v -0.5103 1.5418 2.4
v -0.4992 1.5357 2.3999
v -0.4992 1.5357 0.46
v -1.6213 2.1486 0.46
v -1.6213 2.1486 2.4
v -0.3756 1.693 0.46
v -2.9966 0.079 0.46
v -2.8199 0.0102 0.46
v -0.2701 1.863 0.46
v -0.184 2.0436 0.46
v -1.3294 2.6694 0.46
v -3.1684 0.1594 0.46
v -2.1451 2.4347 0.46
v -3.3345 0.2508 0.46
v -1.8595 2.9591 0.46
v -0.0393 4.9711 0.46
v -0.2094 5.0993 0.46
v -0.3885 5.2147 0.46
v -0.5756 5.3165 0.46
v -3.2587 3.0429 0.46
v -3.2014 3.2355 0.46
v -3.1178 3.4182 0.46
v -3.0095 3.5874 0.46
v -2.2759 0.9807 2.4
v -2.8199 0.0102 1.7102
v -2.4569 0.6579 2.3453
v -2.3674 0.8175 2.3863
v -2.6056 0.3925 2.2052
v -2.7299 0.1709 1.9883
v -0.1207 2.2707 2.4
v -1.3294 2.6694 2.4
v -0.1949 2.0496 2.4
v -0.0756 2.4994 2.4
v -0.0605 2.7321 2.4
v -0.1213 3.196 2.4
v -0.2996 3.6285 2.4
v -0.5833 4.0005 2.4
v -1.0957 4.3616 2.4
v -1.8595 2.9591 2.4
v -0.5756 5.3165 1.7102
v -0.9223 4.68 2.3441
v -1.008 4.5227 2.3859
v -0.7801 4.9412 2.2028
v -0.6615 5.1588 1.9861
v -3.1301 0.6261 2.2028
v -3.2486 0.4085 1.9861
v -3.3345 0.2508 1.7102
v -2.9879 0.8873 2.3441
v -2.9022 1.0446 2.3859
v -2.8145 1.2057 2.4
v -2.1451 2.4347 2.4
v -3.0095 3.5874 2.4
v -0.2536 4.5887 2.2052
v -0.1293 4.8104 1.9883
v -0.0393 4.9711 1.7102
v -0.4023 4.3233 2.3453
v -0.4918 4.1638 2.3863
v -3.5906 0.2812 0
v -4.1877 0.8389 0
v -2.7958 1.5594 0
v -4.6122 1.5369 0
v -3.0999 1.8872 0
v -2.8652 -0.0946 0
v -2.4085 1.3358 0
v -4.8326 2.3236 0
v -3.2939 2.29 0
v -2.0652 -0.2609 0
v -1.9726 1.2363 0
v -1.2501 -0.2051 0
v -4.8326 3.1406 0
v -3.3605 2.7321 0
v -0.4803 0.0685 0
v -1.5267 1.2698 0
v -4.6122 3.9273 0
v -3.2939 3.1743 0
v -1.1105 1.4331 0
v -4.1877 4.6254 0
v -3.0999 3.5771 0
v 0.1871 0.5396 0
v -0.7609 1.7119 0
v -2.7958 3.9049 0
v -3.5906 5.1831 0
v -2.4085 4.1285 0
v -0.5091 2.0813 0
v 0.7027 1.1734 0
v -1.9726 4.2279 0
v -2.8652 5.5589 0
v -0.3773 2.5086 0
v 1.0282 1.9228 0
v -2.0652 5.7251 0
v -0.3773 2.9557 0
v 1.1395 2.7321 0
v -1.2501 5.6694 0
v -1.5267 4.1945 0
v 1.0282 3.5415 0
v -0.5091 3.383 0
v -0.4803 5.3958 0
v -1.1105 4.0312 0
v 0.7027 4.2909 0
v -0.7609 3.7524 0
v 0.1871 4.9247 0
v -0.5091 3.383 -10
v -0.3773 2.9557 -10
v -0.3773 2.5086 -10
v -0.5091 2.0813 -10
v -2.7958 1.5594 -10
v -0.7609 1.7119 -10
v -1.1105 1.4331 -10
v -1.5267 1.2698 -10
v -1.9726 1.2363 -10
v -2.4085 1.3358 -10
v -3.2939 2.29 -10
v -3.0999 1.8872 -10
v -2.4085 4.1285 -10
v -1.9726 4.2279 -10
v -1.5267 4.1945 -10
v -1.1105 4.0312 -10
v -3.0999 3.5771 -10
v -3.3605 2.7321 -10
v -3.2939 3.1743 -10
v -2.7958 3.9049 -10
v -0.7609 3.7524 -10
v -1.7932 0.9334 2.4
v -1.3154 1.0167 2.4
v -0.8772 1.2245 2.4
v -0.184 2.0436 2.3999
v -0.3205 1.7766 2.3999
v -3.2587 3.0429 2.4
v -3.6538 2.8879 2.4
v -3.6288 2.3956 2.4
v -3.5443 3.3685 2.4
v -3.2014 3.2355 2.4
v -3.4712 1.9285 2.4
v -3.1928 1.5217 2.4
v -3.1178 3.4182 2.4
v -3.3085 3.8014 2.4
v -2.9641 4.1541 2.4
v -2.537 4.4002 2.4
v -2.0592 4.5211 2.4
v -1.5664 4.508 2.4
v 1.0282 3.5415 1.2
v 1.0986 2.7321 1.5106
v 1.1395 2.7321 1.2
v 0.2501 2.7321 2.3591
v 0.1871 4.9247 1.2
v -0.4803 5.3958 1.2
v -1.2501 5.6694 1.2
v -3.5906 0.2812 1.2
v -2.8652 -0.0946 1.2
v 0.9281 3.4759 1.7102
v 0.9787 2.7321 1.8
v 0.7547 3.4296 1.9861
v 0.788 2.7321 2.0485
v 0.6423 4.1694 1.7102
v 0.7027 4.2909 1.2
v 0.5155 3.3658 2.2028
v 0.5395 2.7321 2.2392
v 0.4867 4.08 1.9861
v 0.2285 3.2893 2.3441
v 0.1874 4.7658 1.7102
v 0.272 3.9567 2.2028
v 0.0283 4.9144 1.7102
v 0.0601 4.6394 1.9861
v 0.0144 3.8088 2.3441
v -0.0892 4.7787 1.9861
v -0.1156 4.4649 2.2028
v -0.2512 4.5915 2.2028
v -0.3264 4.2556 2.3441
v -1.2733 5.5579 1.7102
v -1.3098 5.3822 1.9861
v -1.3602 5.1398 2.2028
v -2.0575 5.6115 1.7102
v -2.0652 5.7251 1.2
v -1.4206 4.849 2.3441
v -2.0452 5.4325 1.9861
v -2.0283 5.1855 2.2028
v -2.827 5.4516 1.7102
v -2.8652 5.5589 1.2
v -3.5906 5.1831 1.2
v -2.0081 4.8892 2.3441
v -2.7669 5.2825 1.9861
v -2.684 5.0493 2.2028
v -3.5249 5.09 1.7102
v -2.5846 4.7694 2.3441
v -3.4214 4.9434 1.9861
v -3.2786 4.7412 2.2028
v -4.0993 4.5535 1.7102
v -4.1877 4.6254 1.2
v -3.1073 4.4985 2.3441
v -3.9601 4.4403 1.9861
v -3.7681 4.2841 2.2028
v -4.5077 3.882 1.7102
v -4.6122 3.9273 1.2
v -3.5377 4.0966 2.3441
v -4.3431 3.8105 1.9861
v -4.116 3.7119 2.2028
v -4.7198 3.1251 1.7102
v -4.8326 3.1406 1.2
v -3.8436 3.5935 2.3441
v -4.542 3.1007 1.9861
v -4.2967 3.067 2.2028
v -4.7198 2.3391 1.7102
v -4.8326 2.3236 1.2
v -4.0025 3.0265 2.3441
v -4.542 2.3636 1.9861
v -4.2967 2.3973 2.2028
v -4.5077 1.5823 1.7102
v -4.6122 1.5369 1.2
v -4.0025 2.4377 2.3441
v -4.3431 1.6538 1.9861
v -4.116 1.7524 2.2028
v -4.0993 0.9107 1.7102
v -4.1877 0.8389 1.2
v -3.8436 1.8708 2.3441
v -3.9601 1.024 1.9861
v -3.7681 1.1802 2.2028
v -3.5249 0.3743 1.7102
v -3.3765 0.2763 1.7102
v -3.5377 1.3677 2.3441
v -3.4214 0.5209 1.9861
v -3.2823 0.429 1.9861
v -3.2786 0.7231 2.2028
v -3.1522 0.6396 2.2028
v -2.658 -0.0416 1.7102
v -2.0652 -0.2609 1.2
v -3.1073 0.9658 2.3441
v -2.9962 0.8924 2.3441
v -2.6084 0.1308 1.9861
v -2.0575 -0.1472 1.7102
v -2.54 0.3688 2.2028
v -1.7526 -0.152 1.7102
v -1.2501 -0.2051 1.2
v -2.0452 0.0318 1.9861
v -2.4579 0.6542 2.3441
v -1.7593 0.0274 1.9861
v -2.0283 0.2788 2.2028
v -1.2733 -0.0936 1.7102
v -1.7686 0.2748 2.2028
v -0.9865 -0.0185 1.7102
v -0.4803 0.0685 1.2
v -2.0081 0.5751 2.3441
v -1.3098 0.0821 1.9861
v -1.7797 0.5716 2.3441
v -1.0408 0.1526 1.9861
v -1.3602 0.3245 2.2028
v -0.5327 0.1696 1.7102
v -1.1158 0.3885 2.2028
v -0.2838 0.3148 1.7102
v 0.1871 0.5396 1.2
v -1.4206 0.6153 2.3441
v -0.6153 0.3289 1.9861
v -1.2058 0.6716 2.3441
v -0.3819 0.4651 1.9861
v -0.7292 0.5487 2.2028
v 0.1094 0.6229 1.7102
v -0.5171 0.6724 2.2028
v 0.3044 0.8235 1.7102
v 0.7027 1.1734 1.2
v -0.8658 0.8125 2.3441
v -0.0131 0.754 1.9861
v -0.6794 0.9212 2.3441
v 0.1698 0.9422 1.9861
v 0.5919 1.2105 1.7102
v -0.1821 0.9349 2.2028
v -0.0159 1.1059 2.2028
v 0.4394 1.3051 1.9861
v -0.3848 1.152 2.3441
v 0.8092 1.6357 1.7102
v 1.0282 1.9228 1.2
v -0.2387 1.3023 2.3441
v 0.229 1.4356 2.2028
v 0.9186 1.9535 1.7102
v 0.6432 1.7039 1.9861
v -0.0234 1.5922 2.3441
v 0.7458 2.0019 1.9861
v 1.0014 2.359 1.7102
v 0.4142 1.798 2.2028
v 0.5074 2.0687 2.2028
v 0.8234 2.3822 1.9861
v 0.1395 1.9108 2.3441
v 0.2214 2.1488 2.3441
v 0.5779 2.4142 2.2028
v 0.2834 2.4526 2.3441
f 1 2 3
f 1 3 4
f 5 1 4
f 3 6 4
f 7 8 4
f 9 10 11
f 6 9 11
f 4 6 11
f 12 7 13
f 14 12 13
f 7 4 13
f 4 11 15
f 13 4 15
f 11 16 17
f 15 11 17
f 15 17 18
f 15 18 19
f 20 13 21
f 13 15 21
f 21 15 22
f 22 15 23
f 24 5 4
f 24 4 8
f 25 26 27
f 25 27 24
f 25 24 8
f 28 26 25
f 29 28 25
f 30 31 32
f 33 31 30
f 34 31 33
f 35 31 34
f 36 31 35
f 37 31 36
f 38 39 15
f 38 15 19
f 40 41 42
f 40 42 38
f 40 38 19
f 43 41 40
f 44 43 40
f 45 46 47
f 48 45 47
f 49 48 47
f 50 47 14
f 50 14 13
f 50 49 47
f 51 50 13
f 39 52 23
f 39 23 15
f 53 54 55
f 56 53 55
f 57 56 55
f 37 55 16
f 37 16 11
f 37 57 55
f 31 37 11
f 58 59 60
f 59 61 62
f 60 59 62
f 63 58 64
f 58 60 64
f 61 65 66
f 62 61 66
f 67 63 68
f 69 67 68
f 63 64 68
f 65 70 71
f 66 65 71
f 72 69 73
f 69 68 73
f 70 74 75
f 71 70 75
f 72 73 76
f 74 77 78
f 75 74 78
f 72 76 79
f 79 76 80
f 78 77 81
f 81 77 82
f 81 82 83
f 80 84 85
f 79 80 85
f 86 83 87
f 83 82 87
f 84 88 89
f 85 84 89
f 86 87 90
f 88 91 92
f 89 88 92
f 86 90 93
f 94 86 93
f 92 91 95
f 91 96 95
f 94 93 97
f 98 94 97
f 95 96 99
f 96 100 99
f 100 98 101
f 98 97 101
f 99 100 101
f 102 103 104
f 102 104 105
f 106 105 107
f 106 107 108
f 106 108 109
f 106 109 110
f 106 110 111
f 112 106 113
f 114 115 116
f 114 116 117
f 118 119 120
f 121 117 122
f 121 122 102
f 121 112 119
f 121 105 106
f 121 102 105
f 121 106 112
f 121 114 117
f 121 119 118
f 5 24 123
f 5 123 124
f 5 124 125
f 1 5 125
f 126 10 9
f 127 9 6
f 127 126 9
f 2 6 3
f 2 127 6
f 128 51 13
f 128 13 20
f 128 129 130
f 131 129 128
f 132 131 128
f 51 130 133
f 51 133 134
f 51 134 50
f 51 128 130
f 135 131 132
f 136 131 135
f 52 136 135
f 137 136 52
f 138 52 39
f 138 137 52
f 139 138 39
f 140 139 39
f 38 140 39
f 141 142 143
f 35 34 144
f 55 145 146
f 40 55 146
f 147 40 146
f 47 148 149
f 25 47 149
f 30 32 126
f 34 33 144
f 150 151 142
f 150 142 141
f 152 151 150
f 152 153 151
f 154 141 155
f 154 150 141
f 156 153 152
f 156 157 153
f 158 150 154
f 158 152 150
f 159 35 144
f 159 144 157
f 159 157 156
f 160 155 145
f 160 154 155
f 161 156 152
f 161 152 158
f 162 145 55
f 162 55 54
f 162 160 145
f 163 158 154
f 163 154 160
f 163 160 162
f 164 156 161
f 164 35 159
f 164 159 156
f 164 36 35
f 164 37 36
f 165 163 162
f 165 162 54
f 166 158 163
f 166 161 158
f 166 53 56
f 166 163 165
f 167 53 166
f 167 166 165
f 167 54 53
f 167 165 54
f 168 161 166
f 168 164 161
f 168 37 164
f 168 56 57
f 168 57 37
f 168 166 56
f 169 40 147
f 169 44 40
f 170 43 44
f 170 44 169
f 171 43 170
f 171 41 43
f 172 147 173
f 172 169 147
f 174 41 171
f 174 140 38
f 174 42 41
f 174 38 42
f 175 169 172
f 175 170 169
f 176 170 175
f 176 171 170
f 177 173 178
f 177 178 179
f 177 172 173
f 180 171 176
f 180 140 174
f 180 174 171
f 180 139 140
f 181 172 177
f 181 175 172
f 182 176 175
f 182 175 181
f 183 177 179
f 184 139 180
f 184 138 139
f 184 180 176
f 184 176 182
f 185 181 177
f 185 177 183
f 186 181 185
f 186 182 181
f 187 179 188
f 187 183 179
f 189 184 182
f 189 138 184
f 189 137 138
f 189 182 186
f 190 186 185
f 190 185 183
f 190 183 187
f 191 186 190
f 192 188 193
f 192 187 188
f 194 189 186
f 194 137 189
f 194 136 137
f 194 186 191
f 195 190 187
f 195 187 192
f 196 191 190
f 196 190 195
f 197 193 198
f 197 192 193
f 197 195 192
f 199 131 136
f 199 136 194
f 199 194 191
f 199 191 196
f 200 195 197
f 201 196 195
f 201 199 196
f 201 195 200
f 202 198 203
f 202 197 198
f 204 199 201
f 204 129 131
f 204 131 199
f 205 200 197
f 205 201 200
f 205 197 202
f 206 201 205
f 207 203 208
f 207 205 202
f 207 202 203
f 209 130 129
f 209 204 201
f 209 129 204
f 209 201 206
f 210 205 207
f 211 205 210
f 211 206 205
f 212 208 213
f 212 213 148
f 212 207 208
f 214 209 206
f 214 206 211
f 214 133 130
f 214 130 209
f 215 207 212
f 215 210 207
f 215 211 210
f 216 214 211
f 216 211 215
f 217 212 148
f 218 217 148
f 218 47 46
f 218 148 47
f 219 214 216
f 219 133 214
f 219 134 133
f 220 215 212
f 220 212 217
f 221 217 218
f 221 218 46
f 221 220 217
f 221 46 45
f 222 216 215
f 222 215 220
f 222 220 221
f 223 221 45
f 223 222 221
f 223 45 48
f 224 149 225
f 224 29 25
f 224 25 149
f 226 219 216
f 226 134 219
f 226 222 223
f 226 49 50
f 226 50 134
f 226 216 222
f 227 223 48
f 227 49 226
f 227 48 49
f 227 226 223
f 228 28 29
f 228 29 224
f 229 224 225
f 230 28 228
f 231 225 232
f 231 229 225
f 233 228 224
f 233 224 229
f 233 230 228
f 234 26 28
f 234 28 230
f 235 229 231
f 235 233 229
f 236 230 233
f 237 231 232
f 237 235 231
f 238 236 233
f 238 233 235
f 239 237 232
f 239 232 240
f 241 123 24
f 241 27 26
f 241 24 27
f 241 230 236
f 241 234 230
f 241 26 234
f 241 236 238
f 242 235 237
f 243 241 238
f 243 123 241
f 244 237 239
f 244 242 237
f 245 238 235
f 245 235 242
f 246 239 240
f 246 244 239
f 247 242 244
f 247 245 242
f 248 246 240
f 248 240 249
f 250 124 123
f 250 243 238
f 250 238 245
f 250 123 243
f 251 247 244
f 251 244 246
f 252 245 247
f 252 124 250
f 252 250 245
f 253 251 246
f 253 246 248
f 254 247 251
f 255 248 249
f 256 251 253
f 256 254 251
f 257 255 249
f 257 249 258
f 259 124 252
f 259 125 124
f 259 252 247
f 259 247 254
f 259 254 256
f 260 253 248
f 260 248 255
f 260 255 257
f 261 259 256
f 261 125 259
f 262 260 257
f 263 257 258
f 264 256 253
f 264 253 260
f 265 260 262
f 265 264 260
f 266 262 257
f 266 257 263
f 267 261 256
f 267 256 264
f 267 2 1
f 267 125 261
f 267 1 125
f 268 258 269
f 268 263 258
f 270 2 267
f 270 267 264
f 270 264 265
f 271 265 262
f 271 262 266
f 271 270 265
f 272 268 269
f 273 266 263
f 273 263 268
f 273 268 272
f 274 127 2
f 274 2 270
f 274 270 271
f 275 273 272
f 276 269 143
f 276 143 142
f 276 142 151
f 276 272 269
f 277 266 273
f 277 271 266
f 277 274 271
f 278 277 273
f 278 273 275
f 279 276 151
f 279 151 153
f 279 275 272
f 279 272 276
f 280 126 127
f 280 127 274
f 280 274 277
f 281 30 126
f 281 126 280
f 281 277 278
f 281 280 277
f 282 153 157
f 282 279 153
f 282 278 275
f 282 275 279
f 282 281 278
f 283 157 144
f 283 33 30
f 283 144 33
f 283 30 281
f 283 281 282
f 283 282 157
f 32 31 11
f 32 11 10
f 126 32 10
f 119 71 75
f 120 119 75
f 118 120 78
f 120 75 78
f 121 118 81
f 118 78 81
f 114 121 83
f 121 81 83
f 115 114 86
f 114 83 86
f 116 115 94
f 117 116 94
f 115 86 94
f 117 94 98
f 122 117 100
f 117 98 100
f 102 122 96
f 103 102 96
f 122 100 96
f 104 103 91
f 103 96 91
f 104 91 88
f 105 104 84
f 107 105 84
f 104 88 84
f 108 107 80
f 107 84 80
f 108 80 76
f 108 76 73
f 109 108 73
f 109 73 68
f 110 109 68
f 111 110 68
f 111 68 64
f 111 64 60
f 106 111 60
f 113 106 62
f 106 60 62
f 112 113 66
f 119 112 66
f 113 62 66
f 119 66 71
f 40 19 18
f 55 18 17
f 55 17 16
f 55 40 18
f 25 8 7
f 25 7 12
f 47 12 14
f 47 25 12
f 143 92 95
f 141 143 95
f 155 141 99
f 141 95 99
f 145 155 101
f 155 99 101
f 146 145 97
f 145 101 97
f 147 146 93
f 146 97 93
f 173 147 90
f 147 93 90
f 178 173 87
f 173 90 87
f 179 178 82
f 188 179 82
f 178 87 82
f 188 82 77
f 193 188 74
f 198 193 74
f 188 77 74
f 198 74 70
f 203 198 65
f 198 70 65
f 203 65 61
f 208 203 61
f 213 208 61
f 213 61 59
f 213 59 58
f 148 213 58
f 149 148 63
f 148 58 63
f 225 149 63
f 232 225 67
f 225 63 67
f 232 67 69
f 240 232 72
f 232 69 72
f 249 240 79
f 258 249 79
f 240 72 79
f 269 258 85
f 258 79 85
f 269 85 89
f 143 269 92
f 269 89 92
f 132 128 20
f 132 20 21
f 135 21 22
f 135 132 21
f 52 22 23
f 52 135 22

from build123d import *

# Parameters (mm, degrees)
SZKIC1_R                    = 3
DODANIE_WYCI_GNI_CIE2_DEPTH = 2.4
SZKIC2_R                    = 1.5
DODANIE_WYCI_GNI_CIE3_DEPTH = 10
ZAOKR_GLENIE2_R             = 1.2
WYTNIJ_WYCI_GNI_CIE1_DEPTH  = 1.94


with BuildPart() as part:
    # Szkic1 → Dodanie-wyciągnięcie2 (new body)
    with BuildSketch(Plane.XY):
        with Locations((-1.860516246, 2.732142857)):
            Circle(SZKIC1_R)
    extrude(amount=DODANIE_WYCI_GNI_CIE2_DEPTH)

    # Szkic2 → Dodanie-wyciągnięcie3 (add)
    with BuildSketch(Plane(origin=(0, 0, 0), x_dir=(-1, 0, 0), z_dir=(0, 0, -1))):
        with Locations((1.860516246, 2.732142857)):
            Circle(SZKIC2_R)
    extrude(amount=DODANIE_WYCI_GNI_CIE3_DEPTH)

    # Zaokrąglenie2
    zaokr_glenie2_edges = [part.edges().sort_by_distance(p)[0] for p in [
        (-4.860516246, 2.732142857, 2.4),
    ]]
    fillet(zaokr_glenie2_edges, radius=ZAOKR_GLENIE2_R)

    # Szkic3 → Wytnij-wyciągnięcie1 (cut)
    with BuildSketch(Plane.XY.offset(2.4)):
        with BuildLine():
            Line((-1.859548318, 2.959091853), (-0.575649693, 5.316481314))
            ThreePointArc((-0.575649693, 5.316481314), (-0.297886623, 5.158637444), (-0.039271083, 4.97106076))
            Line((-0.039271083, 4.97106076), (-1.329373025, 2.669425378))
            Line((-1.329373025, 2.669425378), (-0.183967515, 2.043621837))
            ThreePointArc((-0.183967515, 2.043621837), (-0.320475658, 1.776553075), (-0.499159616, 1.535654258))
            Line((-0.499159616, 1.535654258), (-1.621312108, 2.148584891))
            Line((-1.621312108, 2.148584891), (-2.819933608, 0.01015725))
            ThreePointArc((-2.819933608, 0.01015725), (-3.083174674, 0.117799023), (-3.33454353, 0.250826496))
            Line((-3.33454353, 0.250826496), (-2.145142944, 2.434706401))
            Line((-2.145142944, 2.434706401), (-3.258687897, 3.042935511))
            ThreePointArc((-3.258687897, 3.042935511), (-3.162842423, 3.328316127), (-3.009463836, 3.587359481))
            Line((-3.009463836, 3.587359481), (-1.859548318, 2.959091853))
        make_face()
    extrude(amount=-WYTNIJ_WYCI_GNI_CIE1_DEPTH, mode=Mode.SUBTRACT)


solid = part.part
